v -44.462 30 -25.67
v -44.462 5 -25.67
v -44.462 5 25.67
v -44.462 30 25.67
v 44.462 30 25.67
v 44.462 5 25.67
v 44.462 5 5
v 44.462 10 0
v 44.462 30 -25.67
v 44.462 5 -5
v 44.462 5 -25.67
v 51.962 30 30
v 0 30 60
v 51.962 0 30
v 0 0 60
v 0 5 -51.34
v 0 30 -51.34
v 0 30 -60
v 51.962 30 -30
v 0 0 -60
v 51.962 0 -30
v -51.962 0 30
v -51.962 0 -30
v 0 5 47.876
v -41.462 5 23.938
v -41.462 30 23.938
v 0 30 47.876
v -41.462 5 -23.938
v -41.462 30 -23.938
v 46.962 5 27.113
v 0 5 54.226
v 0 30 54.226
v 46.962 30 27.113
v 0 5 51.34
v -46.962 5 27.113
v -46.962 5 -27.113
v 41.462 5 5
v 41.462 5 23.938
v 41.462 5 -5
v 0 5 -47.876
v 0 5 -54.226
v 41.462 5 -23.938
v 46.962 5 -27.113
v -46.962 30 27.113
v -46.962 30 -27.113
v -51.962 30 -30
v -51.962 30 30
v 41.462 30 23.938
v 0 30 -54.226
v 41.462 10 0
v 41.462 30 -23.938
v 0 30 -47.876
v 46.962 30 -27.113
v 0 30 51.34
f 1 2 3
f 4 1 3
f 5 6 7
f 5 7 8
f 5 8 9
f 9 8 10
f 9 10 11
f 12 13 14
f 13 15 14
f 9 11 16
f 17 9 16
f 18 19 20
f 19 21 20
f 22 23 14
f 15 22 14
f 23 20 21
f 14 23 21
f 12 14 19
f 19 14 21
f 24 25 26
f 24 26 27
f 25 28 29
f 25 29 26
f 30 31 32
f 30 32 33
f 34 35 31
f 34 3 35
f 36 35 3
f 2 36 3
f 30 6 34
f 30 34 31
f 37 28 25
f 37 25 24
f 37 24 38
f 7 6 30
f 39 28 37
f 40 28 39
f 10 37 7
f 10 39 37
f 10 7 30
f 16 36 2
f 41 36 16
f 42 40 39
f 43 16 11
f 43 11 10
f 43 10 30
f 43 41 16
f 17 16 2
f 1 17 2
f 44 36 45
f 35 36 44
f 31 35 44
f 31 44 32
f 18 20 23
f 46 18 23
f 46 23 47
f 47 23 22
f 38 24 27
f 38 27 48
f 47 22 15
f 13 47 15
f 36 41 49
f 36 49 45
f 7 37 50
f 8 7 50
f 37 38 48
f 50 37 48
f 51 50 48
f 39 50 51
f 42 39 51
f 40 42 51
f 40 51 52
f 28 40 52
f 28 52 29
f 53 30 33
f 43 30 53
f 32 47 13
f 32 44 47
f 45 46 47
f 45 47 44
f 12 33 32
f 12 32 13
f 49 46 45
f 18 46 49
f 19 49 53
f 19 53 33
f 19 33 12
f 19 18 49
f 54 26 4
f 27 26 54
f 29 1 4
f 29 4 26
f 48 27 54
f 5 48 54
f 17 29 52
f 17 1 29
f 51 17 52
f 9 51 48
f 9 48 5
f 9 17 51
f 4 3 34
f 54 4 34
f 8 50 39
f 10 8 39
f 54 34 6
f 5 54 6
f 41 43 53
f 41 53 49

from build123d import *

# Parameters (mm, degrees)
BOSS_EXTRUDE1_DEPTH = 5
BOSS_EXTRUDE2_DEPTH = 25
BOSS_EXTRUDE4_DEPTH = 25
CUT_EXTRUDE1_DEPTH  = 3


with BuildPart() as part:
    # layout → Boss-Extrude1 (new body)
    with BuildSketch(Plane(origin=(0, 0, 0), x_dir=(1, 0, 0), z_dir=(0, 1, 0))):
        Polygon((0, -60), (51.961524227, -30), (51.961524227, 30), (0, 60), (-51.961524227, 30), (-51.961524227, -30), align=None)
    extrude(amount=BOSS_EXTRUDE1_DEPTH)

    # Sketch2 → Boss-Extrude2 (add)
    with BuildSketch(Plane(origin=(0, 5, 0), x_dir=(1, 0, 0), z_dir=(0, 1, 0))):
        Polygon((-51.961524227, -30), (0, -60), (51.961524227, -30), (51.961524227, 30), (0, 60), (-51.961524227, 30), align=None)
        Polygon((-46.961524227, -27.113248654), (0, -54.226497308), (46.961524227, -27.113248654), (46.961524227, 27.113248654), (0, 54.226497308), (-46.961524227, 27.113248654), align=None, mode=Mode.SUBTRACT)
    extrude(amount=BOSS_EXTRUDE2_DEPTH)

    # Sketch3 → Boss-Extrude4 (add)
    with BuildSketch(Plane(origin=(0, 5, 0), x_dir=(1, 0, 0), z_dir=(0, 1, 0))):
        Polygon((-44.461524227, 25.669872981), (-44.461524227, -25.669872981), (0, -51.339745962), (44.461524227, -25.669872981), (44.461524227, 25.669872981), (0, 51.339745962), align=None)
        Polygon((0, 47.875644347), (-41.461524227, 23.937822174), (-41.461524227, -23.937822174), (0, -47.875644347), (41.461524227, -23.937822174), (41.461524227, 23.937822174), align=None, mode=Mode.SUBTRACT)
    extrude(amount=BOSS_EXTRUDE4_DEPTH)

    # Sketch4 → Cut-Extrude1 (cut)
    with BuildSketch(Plane.ZY.offset(-41.461524227)):
        Polygon((-5, 5), (5, 5), (0, 10), align=None)
    extrude(amount=-CUT_EXTRUDE1_DEPTH, mode=Mode.SUBTRACT)


solid = part.part
